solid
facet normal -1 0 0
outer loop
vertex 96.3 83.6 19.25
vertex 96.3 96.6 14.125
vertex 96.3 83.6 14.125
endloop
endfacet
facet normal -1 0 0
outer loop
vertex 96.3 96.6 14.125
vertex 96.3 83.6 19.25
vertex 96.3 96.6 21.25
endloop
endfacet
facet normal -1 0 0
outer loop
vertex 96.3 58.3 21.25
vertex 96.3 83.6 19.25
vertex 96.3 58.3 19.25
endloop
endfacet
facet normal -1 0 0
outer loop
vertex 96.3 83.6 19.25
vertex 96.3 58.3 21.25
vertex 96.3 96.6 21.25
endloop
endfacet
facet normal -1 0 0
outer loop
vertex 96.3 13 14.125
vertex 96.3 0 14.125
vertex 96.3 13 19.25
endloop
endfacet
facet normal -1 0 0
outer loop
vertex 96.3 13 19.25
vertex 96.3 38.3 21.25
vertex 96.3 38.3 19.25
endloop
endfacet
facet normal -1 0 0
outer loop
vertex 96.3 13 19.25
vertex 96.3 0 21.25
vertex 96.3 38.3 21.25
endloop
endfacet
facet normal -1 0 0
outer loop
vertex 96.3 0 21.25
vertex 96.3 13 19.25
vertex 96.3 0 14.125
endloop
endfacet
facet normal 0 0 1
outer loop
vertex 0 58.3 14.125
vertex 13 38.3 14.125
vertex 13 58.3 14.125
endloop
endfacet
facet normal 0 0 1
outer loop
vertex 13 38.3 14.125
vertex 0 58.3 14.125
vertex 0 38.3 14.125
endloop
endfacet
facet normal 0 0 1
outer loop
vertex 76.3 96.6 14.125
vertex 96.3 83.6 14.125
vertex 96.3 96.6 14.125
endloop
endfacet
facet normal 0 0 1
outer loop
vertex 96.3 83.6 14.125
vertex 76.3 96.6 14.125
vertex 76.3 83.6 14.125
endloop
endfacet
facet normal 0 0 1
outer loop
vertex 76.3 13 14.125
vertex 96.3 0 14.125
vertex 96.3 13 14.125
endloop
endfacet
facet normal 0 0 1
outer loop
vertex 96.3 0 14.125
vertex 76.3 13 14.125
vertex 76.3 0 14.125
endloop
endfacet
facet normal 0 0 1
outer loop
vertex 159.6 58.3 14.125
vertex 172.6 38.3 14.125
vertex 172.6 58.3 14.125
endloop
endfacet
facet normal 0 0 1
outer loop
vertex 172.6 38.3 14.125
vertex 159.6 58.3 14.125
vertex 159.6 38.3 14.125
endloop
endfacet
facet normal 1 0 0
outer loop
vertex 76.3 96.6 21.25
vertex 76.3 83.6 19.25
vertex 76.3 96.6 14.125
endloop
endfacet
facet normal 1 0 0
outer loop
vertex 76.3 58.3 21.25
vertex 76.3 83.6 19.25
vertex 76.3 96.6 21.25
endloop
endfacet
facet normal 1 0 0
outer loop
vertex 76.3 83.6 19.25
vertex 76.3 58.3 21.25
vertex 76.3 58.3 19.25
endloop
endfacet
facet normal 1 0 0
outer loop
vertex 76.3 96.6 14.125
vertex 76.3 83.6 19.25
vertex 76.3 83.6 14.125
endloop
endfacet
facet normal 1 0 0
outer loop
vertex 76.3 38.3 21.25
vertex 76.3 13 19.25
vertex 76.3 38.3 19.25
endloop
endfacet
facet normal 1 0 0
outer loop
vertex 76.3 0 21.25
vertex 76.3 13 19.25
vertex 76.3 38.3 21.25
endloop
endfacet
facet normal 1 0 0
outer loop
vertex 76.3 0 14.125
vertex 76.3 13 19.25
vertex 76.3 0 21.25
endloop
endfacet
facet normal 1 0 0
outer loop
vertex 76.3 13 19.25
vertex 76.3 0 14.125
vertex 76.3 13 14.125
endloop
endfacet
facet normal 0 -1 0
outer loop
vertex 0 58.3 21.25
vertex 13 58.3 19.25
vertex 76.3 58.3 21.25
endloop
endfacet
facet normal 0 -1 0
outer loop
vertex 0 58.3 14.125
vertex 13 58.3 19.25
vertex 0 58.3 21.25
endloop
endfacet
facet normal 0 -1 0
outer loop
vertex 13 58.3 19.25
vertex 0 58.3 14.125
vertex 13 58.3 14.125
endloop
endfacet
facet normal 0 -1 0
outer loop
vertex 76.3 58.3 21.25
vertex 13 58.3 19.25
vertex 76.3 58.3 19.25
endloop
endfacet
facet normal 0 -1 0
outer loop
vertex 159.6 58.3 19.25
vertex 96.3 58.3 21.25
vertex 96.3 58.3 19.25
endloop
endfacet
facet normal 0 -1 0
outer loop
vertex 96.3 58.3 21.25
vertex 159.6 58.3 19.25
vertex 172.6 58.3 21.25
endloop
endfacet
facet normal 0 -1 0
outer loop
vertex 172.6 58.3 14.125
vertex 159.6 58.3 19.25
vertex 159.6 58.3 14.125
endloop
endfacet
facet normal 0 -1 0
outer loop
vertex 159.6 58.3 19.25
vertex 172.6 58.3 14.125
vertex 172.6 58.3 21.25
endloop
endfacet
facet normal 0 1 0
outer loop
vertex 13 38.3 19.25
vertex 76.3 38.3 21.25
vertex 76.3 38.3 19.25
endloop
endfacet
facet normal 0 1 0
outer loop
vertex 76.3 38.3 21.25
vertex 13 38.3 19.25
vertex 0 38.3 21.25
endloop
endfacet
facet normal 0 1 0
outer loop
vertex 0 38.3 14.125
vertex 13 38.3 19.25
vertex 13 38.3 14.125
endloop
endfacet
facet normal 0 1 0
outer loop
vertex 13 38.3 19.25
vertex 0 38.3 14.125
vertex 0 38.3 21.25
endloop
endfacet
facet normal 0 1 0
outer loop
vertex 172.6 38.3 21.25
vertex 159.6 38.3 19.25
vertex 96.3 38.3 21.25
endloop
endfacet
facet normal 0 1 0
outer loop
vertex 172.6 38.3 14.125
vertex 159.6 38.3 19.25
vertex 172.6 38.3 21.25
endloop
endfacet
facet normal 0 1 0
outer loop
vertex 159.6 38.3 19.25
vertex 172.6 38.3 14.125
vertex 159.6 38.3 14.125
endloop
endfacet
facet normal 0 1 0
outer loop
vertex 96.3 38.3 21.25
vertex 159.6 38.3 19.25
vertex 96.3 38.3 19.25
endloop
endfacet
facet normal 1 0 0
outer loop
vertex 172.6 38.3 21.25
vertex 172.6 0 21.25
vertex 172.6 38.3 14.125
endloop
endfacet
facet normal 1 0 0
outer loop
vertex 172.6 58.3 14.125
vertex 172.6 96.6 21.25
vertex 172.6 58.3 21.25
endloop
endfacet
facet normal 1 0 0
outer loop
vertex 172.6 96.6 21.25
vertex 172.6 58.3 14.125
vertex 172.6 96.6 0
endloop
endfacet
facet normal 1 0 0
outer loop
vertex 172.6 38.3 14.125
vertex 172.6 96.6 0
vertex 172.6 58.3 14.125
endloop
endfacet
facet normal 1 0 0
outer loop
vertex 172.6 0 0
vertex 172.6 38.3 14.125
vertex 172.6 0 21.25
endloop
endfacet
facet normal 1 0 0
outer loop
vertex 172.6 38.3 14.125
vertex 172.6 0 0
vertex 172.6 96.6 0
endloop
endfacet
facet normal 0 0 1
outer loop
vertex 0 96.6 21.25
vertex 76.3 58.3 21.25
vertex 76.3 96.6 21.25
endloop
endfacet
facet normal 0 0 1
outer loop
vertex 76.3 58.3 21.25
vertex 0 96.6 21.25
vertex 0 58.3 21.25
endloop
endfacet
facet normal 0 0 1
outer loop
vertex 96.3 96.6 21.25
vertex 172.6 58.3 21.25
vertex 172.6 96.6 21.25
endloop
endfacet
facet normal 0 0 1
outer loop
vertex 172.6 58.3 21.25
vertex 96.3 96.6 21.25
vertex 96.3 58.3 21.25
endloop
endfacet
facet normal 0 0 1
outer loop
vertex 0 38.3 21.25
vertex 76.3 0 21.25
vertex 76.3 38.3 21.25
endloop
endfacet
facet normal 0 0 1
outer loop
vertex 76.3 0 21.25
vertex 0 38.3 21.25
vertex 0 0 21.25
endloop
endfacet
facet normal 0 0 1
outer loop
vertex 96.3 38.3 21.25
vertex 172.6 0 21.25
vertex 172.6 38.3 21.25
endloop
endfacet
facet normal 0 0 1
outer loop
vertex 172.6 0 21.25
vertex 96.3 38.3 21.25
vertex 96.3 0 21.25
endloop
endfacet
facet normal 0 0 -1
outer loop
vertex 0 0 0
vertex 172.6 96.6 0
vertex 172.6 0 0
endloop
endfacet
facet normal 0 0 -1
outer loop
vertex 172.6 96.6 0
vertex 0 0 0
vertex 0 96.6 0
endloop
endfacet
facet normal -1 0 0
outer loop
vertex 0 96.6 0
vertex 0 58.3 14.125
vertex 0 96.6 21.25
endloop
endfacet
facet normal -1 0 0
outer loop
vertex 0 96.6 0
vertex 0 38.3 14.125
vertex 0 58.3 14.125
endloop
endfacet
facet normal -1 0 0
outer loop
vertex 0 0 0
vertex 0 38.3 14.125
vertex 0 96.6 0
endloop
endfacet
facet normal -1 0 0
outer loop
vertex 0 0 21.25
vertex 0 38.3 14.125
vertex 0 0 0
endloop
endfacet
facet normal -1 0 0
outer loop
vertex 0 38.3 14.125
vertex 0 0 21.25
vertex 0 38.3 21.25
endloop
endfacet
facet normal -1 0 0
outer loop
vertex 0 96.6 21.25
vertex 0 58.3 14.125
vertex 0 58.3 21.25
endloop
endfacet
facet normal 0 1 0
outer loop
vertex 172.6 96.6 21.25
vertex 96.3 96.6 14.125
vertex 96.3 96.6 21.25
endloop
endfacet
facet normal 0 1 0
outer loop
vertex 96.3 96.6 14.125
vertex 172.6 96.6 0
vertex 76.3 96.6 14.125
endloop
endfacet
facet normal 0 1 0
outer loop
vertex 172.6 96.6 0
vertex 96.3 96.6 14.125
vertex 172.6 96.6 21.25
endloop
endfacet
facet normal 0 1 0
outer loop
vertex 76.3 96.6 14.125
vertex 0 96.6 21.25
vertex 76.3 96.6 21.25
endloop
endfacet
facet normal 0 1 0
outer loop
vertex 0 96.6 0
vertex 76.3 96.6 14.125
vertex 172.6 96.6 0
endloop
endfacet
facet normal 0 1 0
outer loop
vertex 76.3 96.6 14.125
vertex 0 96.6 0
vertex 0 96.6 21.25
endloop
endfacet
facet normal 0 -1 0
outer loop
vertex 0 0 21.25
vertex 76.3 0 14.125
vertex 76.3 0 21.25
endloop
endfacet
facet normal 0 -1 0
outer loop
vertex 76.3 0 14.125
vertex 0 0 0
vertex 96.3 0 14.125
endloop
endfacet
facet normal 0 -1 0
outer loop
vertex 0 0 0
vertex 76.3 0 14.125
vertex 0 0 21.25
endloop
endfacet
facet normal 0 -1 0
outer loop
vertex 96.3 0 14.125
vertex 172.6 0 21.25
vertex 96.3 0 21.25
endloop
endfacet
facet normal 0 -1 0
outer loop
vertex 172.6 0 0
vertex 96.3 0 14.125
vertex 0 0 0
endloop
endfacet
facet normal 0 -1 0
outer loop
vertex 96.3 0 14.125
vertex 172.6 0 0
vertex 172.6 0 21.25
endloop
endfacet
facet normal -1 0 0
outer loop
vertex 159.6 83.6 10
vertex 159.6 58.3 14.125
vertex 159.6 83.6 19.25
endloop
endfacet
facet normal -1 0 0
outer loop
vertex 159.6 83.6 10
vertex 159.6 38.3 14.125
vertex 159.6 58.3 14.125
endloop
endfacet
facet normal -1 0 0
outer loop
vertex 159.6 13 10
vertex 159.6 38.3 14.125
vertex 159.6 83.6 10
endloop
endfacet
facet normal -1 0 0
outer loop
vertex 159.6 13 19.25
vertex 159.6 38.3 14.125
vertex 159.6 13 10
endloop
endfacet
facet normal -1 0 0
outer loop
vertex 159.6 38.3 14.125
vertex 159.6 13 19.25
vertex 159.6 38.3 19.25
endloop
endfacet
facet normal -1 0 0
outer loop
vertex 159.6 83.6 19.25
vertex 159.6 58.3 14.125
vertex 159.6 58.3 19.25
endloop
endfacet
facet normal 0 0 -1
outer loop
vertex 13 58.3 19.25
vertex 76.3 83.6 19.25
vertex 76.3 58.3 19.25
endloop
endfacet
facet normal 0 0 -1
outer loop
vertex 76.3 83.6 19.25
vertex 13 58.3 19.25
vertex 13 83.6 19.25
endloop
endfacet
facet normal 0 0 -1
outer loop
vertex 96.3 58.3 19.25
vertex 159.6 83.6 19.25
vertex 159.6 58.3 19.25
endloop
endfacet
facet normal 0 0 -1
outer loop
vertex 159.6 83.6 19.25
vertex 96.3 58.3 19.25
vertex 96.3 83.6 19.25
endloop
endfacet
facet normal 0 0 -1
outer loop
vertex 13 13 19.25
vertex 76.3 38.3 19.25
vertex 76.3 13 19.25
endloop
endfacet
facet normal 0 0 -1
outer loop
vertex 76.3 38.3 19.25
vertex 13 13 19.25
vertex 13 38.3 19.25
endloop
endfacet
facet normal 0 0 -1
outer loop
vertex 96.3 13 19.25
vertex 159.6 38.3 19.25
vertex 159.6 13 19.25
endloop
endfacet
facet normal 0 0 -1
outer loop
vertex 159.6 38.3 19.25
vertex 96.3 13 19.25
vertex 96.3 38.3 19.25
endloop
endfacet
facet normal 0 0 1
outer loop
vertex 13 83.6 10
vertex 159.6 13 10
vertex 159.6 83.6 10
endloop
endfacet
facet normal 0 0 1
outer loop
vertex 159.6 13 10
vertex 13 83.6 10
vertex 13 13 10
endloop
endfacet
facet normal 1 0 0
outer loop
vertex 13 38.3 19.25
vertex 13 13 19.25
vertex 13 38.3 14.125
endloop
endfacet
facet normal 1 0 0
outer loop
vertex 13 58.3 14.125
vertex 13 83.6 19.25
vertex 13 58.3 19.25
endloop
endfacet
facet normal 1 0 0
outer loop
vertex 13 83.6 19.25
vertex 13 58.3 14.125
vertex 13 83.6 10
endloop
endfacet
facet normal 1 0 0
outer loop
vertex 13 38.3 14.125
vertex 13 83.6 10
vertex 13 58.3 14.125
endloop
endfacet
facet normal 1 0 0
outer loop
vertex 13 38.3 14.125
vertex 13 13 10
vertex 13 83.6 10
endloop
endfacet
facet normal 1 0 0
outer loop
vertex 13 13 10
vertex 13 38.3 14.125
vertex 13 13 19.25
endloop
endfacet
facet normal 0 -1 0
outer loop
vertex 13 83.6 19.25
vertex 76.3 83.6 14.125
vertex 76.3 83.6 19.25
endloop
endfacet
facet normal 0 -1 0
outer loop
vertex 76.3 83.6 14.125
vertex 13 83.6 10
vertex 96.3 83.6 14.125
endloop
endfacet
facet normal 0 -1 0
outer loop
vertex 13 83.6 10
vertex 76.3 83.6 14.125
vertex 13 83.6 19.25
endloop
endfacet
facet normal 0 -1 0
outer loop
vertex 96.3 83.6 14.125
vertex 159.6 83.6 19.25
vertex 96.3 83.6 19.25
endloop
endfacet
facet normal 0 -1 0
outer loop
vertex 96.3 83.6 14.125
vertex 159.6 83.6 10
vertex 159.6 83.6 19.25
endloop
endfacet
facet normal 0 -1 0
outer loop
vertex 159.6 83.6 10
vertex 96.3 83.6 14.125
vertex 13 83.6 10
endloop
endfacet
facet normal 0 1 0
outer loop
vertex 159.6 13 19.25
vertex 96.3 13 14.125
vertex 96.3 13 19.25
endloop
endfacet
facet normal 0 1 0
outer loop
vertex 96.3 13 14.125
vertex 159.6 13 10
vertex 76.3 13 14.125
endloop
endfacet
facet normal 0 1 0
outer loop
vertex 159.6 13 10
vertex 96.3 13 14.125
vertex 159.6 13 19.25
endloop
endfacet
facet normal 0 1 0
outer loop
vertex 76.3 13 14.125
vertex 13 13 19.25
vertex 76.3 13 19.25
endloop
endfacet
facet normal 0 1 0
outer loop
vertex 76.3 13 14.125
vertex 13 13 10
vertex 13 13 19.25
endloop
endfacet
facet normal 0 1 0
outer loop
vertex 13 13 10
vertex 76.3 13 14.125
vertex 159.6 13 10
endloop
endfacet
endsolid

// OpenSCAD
// Fixture for: iphone_15_pro_fixture
// Generated by Kim Formlabs Bot
// Operation: soldering

// Dimensions
object_length = 146.60;
object_width = 70.60;
object_height = 8.25;
wall_thickness = 3.00;
base_height = 10.00;
clearance = 10.00;

// Calculated
total_length = object_length + wall_thickness * 2 + clearance * 2;
total_width = object_width + wall_thickness * 2 + clearance * 2;
total_height = object_height + base_height + wall_thickness;

module object_cutout() {
    translate([wall_thickness + clearance, 
               wall_thickness + clearance, 
               base_height])
        cube([object_length, object_width, object_height + 1]);
}

module grip_cutouts() {
    // Side access cutouts
    translate([total_length/2 - 10, -1, base_height + object_height/2])
        cube([20, total_width + 2, 10]);
    
    // Front/back access
    translate([-1, total_width/2 - 10, base_height + object_height/2])
        cube([total_length + 2, 20, 10]);
}

module fixture() {
    difference() {
        // Main block
        cube([total_length, total_width, total_height]);
        
        // Object cavity
        object_cutout();
        
        // Tool access
        grip_cutouts();
        
        // Text label
        translate([total_length/2, total_width/2, total_height - 0.5])
            linear_extrude(1)
                text("iphone_15_pro_fixture", size=5, halign="center", valign="center");
    }
}

// Render
fixture();
